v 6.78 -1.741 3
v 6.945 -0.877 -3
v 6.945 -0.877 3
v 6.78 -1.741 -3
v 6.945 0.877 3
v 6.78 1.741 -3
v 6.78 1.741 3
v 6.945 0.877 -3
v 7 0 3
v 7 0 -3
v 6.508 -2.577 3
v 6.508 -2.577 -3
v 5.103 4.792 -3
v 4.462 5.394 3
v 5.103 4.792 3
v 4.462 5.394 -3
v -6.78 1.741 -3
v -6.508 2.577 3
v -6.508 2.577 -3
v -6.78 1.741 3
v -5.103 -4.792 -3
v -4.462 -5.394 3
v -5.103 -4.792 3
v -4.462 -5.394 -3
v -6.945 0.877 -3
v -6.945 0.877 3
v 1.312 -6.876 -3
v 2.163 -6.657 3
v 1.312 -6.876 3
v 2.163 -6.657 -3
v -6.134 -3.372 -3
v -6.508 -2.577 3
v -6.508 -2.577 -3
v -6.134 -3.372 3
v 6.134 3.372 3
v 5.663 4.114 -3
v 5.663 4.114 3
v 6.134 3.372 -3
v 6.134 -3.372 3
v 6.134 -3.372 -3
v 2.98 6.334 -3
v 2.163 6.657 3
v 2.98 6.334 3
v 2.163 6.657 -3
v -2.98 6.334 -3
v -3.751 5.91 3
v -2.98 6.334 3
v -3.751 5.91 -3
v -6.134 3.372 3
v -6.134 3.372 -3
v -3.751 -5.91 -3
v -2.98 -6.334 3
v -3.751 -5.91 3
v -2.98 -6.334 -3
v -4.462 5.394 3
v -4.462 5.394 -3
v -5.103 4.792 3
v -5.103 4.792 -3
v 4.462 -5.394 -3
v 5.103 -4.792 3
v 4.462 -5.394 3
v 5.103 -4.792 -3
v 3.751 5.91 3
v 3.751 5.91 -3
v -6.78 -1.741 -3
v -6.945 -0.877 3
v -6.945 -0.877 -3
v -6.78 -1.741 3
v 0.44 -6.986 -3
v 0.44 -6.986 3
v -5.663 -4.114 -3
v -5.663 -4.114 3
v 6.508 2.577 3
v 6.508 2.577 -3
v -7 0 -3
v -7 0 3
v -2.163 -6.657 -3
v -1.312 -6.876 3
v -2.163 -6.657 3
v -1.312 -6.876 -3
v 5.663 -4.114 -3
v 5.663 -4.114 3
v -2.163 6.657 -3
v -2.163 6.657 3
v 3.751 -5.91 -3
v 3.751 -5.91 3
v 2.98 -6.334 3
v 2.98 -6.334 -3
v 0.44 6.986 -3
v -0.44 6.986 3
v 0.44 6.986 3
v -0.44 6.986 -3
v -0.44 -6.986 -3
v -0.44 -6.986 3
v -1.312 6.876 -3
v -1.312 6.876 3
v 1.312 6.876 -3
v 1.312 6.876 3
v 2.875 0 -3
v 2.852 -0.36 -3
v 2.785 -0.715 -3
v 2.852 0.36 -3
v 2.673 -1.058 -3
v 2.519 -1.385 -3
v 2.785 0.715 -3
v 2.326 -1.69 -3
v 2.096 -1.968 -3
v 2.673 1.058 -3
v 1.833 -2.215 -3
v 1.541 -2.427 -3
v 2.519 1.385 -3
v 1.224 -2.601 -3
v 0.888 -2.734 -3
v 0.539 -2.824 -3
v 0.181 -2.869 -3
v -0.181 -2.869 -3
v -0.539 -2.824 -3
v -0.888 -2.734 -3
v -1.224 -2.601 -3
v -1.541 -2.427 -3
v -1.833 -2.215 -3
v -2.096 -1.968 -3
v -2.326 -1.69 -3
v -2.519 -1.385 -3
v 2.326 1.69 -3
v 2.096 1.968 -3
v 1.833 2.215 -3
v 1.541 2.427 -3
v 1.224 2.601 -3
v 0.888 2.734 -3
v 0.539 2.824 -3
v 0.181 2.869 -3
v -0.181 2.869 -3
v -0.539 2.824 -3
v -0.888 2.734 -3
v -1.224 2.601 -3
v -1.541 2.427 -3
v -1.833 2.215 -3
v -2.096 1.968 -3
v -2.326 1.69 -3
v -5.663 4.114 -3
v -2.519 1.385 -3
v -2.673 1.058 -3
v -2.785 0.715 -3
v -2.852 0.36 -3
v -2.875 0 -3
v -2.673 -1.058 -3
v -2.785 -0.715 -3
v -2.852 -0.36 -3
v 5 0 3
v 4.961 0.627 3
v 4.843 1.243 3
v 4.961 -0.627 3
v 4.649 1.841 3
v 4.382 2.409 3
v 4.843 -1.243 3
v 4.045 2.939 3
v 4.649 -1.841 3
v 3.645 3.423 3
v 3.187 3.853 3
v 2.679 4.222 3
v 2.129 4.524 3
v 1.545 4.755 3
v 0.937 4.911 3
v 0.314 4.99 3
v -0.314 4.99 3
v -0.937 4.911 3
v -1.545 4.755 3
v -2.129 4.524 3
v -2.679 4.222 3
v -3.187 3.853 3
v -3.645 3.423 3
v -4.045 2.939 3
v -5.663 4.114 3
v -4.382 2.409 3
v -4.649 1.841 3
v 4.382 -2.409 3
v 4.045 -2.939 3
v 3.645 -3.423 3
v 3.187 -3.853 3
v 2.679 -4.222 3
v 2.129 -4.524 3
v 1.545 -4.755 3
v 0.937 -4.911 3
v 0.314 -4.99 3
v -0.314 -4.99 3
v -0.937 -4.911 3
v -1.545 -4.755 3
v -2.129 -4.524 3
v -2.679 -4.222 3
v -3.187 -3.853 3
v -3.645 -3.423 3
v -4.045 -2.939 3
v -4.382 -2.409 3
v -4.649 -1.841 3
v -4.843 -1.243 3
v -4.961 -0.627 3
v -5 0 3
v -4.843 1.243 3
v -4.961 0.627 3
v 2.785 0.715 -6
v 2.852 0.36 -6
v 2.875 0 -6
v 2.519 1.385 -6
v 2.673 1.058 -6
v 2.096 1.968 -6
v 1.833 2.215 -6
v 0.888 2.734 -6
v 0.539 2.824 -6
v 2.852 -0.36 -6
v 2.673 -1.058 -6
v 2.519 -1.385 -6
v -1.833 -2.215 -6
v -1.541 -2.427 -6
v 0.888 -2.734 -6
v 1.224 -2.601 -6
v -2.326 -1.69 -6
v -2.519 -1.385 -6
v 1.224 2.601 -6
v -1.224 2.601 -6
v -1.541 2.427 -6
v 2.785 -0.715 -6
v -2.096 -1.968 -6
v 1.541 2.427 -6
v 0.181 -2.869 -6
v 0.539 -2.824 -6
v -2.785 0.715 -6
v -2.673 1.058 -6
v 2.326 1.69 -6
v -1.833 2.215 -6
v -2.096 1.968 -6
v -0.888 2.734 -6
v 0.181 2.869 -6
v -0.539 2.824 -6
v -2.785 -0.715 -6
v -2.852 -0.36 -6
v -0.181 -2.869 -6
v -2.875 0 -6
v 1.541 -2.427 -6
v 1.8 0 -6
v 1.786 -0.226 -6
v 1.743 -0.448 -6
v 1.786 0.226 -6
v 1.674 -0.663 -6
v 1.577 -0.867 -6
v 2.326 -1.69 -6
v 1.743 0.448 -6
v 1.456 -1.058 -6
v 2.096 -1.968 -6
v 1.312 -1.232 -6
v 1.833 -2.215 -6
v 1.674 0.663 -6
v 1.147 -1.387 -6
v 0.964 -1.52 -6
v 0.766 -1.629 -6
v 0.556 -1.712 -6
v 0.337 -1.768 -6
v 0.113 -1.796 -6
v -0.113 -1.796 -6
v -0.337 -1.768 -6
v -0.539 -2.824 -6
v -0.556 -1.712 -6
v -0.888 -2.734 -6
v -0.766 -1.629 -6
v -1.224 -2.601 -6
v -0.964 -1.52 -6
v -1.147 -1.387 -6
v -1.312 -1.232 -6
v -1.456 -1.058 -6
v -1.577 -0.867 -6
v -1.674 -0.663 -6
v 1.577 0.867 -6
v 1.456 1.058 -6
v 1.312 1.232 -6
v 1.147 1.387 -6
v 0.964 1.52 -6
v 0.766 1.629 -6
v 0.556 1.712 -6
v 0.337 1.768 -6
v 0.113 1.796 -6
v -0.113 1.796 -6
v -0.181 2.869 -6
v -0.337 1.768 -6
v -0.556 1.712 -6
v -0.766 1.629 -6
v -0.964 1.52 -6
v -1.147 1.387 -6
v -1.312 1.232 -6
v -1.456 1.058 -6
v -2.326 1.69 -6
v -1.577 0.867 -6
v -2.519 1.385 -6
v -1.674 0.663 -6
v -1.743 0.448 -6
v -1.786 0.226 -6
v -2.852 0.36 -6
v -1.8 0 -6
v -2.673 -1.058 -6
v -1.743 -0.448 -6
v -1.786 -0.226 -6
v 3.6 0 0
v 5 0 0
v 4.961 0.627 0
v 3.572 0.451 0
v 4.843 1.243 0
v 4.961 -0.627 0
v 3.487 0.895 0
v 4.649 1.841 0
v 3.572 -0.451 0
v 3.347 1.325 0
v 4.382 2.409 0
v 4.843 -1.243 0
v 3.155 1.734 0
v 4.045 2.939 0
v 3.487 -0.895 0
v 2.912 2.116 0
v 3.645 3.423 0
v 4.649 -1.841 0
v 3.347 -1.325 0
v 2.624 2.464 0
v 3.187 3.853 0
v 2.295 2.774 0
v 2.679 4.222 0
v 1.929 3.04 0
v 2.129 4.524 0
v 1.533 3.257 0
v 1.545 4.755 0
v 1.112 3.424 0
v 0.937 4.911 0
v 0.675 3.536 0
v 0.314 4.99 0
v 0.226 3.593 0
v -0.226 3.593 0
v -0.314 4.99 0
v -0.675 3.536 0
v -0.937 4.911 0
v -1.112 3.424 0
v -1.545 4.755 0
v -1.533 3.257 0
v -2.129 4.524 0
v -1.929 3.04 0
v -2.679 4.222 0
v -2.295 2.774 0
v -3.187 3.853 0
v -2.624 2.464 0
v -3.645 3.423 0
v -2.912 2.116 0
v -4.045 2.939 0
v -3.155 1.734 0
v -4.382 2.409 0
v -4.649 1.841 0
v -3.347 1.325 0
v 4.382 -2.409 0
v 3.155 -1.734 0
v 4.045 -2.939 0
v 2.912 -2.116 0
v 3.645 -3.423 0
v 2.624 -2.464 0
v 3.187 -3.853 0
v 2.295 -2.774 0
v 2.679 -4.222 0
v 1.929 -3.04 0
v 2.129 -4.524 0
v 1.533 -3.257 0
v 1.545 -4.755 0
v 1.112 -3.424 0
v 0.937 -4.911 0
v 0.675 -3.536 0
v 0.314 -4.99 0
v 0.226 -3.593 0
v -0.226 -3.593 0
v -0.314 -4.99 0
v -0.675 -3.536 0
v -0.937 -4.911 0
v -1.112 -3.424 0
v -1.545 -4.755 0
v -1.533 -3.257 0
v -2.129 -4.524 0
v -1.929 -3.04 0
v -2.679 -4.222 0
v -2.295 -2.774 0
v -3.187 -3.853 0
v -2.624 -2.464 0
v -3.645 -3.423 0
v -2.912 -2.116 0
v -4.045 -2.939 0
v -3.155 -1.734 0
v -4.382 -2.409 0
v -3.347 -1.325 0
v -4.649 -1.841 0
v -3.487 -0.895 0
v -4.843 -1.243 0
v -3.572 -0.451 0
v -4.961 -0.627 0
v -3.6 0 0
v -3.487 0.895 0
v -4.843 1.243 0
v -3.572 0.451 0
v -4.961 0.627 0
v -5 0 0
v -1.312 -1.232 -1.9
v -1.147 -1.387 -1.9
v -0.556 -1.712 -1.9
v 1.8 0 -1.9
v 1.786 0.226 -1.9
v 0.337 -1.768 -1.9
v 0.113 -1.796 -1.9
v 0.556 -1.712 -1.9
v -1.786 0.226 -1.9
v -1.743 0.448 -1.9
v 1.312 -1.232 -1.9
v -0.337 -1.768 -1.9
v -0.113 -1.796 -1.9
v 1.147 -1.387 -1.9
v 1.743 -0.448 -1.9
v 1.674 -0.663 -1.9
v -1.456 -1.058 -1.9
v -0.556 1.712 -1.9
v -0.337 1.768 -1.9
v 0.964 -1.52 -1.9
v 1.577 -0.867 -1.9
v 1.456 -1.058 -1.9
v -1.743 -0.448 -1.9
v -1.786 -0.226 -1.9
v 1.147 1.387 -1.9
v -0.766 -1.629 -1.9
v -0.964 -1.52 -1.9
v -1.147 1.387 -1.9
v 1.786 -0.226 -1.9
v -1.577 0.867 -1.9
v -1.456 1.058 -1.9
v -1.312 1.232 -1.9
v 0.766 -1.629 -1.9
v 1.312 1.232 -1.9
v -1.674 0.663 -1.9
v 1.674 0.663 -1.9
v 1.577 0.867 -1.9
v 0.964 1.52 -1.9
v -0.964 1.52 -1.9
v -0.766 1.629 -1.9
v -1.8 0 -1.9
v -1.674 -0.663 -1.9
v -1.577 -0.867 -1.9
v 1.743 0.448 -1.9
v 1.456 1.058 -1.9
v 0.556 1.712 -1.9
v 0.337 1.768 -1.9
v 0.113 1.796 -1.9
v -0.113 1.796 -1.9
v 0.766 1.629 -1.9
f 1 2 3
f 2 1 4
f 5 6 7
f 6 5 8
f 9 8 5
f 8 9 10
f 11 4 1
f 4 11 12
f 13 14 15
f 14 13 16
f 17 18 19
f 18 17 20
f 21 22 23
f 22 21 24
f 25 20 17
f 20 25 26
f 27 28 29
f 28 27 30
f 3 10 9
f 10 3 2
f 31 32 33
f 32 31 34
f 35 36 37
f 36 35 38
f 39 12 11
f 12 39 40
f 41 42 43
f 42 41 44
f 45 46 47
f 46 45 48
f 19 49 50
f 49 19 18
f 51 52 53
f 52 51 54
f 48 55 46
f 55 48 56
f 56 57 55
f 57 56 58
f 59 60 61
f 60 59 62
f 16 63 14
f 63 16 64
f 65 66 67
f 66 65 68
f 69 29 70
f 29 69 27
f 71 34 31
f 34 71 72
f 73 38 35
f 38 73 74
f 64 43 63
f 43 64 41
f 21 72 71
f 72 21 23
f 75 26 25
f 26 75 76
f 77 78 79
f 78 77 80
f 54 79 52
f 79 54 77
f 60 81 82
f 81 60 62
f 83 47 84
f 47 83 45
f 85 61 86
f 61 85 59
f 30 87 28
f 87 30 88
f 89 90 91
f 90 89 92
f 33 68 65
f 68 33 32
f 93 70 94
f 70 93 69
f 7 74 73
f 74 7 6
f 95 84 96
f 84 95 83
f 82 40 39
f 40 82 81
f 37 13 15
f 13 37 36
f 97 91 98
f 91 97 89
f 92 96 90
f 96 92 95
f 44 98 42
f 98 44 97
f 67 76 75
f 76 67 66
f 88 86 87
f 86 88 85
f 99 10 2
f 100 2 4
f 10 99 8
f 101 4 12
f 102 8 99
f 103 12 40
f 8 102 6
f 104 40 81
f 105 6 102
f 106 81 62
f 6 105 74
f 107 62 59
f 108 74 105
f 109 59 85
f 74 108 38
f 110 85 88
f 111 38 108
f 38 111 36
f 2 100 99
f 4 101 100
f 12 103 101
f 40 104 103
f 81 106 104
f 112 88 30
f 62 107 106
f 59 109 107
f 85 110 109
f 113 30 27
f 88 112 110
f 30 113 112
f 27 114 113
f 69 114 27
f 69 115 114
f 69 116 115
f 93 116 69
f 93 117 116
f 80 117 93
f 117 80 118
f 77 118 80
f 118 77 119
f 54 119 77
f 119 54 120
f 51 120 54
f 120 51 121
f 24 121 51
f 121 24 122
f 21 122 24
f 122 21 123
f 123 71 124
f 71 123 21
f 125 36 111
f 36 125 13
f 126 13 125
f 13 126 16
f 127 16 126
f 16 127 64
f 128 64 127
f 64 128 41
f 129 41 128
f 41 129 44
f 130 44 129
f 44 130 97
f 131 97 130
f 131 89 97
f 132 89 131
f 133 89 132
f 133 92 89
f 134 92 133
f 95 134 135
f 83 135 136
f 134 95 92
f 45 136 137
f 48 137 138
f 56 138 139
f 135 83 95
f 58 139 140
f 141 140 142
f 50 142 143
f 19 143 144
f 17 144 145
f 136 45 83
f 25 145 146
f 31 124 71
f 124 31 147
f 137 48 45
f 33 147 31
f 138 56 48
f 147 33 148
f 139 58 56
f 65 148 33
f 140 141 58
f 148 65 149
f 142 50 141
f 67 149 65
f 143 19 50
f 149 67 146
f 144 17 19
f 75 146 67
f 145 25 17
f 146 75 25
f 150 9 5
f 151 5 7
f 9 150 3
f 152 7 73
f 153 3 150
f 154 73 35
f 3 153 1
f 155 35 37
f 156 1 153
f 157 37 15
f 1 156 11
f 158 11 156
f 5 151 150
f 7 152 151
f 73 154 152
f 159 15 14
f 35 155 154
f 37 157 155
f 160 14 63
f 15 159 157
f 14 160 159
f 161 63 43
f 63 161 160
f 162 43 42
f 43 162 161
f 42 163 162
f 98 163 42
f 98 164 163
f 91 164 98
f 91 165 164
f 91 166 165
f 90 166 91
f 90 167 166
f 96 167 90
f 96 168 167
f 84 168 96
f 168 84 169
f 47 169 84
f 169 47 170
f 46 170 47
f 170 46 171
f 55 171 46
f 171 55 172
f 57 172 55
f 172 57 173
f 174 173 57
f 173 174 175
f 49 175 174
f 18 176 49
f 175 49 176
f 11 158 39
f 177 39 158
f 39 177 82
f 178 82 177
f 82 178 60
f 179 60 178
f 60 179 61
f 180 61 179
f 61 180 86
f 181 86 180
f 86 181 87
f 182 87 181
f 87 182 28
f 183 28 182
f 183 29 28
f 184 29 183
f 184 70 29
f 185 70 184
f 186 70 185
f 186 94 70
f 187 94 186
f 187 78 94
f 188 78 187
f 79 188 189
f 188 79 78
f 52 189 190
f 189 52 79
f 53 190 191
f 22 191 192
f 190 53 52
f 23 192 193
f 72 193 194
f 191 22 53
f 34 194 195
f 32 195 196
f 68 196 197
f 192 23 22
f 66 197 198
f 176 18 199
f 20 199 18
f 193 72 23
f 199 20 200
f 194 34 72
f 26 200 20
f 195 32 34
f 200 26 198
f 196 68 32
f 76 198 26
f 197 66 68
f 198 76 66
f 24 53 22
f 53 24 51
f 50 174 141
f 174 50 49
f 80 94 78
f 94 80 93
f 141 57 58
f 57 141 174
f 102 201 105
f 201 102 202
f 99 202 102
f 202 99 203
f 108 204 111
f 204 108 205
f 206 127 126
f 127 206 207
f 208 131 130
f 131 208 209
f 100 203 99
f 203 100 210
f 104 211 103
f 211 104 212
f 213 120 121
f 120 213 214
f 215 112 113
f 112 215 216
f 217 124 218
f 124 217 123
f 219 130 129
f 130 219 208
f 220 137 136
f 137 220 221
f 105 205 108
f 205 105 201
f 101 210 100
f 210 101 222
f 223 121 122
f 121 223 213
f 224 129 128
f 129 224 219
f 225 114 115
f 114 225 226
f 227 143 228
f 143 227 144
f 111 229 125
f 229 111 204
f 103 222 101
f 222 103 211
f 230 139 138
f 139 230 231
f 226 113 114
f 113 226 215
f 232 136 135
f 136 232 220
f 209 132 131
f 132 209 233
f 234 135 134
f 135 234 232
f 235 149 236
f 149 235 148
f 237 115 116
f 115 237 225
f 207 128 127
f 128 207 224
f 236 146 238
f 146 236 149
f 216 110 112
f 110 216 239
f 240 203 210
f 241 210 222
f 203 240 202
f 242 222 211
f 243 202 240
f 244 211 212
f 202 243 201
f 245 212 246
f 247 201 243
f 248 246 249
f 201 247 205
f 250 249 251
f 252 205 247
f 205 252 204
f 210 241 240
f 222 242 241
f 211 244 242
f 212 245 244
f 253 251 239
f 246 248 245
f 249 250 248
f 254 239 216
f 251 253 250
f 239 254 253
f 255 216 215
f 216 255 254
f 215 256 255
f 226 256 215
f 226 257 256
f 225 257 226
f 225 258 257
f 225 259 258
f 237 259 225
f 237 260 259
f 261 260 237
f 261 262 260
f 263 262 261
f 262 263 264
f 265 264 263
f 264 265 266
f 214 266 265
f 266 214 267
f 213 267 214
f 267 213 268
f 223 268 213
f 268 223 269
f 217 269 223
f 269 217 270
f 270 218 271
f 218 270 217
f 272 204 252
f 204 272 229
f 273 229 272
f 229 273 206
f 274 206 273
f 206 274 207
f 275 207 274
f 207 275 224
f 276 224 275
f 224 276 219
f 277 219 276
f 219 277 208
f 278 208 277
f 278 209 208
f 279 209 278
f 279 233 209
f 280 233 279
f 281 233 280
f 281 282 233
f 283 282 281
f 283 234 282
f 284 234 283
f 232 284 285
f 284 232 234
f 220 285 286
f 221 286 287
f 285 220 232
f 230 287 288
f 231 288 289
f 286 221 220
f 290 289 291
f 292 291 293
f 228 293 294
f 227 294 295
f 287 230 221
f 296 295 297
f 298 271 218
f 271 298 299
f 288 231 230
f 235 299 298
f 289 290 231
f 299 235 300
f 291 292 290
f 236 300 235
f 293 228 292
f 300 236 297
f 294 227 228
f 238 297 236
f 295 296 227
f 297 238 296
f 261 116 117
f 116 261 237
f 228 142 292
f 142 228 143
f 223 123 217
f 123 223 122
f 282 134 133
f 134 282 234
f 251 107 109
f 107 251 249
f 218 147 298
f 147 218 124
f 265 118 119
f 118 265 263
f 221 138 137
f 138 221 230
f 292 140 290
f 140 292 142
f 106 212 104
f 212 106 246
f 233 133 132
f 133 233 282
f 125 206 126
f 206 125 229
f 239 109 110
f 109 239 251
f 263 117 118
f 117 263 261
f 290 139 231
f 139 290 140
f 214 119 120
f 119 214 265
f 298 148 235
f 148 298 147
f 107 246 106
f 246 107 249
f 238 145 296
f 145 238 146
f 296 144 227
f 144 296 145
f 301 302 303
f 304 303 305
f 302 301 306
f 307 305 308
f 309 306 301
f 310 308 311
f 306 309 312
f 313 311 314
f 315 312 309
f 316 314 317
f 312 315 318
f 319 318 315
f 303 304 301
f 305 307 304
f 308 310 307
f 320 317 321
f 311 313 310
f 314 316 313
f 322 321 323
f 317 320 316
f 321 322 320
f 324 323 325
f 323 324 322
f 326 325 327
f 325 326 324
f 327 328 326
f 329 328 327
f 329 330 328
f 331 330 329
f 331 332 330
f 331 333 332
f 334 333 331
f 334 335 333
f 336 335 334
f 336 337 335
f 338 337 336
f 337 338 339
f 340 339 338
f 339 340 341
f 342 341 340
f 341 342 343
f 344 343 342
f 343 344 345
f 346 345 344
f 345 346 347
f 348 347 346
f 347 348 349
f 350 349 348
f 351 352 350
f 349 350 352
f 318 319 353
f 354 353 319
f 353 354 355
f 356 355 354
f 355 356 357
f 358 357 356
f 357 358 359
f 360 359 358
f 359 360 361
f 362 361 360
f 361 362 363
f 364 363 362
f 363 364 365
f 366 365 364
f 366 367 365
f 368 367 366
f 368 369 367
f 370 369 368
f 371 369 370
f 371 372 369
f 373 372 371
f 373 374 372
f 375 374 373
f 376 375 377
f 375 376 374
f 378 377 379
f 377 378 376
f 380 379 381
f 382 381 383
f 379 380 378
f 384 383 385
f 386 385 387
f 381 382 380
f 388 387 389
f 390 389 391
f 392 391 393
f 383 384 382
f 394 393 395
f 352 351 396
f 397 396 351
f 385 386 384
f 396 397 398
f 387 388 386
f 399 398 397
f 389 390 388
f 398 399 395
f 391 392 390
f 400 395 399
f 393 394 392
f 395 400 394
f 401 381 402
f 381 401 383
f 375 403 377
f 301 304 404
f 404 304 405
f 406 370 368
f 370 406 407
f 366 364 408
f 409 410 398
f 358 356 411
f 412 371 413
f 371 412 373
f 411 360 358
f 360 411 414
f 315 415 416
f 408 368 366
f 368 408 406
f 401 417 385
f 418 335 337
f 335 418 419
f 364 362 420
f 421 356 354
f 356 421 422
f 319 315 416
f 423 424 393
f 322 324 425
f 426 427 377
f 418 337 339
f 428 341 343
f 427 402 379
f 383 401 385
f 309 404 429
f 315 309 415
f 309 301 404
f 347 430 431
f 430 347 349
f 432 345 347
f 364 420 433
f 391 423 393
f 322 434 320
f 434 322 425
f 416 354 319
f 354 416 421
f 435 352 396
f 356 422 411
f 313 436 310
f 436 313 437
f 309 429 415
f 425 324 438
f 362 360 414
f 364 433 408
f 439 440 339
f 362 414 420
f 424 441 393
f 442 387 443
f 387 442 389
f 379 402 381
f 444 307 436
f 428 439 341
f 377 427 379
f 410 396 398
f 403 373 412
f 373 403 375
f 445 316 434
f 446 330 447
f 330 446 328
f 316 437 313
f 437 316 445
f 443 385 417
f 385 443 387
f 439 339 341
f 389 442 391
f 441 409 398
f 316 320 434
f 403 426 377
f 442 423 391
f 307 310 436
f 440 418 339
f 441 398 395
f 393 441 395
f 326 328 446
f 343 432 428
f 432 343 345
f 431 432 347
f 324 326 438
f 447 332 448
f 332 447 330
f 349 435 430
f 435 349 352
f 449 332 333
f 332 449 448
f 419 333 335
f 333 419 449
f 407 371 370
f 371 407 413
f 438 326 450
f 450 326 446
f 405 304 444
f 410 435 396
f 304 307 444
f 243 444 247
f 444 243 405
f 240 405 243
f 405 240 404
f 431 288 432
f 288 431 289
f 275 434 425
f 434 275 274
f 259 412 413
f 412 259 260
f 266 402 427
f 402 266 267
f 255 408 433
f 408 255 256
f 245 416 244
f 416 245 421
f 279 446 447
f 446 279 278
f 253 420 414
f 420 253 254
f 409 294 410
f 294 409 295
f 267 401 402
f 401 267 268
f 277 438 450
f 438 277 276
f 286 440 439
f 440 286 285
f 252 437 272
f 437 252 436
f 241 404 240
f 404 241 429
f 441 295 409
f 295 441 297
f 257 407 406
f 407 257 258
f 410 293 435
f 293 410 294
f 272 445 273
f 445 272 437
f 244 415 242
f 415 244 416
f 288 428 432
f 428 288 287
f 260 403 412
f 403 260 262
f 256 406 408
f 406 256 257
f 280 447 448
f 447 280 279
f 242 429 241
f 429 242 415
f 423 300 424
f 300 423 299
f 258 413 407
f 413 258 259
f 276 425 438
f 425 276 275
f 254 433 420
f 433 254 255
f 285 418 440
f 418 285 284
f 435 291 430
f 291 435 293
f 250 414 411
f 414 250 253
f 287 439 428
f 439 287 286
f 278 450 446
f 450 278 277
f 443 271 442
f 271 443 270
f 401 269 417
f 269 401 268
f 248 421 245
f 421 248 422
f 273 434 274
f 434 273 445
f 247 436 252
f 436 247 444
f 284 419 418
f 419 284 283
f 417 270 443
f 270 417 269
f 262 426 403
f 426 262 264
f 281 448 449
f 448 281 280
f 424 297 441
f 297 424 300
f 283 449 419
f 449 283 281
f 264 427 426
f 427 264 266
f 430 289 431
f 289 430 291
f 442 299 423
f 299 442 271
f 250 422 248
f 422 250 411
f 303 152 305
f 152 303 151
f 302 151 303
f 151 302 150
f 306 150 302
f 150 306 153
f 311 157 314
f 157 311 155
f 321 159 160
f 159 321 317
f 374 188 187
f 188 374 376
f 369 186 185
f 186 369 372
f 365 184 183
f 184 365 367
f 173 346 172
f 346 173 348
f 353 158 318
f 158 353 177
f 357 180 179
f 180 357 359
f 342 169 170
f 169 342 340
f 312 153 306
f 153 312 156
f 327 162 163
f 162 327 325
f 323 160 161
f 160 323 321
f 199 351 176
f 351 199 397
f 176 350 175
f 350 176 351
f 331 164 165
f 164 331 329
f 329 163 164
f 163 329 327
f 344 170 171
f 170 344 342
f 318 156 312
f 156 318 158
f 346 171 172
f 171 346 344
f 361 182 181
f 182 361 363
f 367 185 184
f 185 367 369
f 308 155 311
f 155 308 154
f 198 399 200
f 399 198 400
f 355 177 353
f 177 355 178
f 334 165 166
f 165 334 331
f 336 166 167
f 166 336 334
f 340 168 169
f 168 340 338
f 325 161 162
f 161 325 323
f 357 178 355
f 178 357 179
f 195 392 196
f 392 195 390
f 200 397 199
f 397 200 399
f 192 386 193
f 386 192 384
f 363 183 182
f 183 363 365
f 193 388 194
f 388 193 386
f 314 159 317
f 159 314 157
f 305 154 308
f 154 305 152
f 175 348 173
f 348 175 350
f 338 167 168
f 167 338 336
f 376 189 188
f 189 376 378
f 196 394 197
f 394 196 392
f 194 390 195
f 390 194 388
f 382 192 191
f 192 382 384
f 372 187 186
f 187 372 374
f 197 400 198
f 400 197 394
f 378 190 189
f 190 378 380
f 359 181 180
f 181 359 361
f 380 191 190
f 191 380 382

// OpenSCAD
$fn = 50;


difference() {
	union() {
		translate(v = [0, 0, -3.0000000000]) {
			cylinder(h = 6, r = 7.0000000000);
		}
		#translate(v = [0, 0, -6.0000000000]) {
			cylinder(h = 6, r = 2.8750000000);
		}
	}
	union() {
		translate(v = [0, 0, 0]) {
			rotate(a = [0, 0, 0]) {
				difference() {
					union() {
						translate(v = [0, 0, -6.0000000000]) {
							cylinder(h = 6, r = 1.5000000000);
						}
						translate(v = [0, 0, -1.9000000000]) {
							cylinder(h = 1.9000000000, r1 = 1.8000000000, r2 = 3.6000000000);
						}
						translate(v = [0, 0, -6.0000000000]) {
							cylinder(h = 6, r = 1.8000000000);
						}
						translate(v = [0, 0, -6.0000000000]) {
							cylinder(h = 6, r = 1.5000000000);
						}
					}
					union();
				}
			}
		}
		#cylinder(h = 3, r = 5.0000000000);
	}
}
